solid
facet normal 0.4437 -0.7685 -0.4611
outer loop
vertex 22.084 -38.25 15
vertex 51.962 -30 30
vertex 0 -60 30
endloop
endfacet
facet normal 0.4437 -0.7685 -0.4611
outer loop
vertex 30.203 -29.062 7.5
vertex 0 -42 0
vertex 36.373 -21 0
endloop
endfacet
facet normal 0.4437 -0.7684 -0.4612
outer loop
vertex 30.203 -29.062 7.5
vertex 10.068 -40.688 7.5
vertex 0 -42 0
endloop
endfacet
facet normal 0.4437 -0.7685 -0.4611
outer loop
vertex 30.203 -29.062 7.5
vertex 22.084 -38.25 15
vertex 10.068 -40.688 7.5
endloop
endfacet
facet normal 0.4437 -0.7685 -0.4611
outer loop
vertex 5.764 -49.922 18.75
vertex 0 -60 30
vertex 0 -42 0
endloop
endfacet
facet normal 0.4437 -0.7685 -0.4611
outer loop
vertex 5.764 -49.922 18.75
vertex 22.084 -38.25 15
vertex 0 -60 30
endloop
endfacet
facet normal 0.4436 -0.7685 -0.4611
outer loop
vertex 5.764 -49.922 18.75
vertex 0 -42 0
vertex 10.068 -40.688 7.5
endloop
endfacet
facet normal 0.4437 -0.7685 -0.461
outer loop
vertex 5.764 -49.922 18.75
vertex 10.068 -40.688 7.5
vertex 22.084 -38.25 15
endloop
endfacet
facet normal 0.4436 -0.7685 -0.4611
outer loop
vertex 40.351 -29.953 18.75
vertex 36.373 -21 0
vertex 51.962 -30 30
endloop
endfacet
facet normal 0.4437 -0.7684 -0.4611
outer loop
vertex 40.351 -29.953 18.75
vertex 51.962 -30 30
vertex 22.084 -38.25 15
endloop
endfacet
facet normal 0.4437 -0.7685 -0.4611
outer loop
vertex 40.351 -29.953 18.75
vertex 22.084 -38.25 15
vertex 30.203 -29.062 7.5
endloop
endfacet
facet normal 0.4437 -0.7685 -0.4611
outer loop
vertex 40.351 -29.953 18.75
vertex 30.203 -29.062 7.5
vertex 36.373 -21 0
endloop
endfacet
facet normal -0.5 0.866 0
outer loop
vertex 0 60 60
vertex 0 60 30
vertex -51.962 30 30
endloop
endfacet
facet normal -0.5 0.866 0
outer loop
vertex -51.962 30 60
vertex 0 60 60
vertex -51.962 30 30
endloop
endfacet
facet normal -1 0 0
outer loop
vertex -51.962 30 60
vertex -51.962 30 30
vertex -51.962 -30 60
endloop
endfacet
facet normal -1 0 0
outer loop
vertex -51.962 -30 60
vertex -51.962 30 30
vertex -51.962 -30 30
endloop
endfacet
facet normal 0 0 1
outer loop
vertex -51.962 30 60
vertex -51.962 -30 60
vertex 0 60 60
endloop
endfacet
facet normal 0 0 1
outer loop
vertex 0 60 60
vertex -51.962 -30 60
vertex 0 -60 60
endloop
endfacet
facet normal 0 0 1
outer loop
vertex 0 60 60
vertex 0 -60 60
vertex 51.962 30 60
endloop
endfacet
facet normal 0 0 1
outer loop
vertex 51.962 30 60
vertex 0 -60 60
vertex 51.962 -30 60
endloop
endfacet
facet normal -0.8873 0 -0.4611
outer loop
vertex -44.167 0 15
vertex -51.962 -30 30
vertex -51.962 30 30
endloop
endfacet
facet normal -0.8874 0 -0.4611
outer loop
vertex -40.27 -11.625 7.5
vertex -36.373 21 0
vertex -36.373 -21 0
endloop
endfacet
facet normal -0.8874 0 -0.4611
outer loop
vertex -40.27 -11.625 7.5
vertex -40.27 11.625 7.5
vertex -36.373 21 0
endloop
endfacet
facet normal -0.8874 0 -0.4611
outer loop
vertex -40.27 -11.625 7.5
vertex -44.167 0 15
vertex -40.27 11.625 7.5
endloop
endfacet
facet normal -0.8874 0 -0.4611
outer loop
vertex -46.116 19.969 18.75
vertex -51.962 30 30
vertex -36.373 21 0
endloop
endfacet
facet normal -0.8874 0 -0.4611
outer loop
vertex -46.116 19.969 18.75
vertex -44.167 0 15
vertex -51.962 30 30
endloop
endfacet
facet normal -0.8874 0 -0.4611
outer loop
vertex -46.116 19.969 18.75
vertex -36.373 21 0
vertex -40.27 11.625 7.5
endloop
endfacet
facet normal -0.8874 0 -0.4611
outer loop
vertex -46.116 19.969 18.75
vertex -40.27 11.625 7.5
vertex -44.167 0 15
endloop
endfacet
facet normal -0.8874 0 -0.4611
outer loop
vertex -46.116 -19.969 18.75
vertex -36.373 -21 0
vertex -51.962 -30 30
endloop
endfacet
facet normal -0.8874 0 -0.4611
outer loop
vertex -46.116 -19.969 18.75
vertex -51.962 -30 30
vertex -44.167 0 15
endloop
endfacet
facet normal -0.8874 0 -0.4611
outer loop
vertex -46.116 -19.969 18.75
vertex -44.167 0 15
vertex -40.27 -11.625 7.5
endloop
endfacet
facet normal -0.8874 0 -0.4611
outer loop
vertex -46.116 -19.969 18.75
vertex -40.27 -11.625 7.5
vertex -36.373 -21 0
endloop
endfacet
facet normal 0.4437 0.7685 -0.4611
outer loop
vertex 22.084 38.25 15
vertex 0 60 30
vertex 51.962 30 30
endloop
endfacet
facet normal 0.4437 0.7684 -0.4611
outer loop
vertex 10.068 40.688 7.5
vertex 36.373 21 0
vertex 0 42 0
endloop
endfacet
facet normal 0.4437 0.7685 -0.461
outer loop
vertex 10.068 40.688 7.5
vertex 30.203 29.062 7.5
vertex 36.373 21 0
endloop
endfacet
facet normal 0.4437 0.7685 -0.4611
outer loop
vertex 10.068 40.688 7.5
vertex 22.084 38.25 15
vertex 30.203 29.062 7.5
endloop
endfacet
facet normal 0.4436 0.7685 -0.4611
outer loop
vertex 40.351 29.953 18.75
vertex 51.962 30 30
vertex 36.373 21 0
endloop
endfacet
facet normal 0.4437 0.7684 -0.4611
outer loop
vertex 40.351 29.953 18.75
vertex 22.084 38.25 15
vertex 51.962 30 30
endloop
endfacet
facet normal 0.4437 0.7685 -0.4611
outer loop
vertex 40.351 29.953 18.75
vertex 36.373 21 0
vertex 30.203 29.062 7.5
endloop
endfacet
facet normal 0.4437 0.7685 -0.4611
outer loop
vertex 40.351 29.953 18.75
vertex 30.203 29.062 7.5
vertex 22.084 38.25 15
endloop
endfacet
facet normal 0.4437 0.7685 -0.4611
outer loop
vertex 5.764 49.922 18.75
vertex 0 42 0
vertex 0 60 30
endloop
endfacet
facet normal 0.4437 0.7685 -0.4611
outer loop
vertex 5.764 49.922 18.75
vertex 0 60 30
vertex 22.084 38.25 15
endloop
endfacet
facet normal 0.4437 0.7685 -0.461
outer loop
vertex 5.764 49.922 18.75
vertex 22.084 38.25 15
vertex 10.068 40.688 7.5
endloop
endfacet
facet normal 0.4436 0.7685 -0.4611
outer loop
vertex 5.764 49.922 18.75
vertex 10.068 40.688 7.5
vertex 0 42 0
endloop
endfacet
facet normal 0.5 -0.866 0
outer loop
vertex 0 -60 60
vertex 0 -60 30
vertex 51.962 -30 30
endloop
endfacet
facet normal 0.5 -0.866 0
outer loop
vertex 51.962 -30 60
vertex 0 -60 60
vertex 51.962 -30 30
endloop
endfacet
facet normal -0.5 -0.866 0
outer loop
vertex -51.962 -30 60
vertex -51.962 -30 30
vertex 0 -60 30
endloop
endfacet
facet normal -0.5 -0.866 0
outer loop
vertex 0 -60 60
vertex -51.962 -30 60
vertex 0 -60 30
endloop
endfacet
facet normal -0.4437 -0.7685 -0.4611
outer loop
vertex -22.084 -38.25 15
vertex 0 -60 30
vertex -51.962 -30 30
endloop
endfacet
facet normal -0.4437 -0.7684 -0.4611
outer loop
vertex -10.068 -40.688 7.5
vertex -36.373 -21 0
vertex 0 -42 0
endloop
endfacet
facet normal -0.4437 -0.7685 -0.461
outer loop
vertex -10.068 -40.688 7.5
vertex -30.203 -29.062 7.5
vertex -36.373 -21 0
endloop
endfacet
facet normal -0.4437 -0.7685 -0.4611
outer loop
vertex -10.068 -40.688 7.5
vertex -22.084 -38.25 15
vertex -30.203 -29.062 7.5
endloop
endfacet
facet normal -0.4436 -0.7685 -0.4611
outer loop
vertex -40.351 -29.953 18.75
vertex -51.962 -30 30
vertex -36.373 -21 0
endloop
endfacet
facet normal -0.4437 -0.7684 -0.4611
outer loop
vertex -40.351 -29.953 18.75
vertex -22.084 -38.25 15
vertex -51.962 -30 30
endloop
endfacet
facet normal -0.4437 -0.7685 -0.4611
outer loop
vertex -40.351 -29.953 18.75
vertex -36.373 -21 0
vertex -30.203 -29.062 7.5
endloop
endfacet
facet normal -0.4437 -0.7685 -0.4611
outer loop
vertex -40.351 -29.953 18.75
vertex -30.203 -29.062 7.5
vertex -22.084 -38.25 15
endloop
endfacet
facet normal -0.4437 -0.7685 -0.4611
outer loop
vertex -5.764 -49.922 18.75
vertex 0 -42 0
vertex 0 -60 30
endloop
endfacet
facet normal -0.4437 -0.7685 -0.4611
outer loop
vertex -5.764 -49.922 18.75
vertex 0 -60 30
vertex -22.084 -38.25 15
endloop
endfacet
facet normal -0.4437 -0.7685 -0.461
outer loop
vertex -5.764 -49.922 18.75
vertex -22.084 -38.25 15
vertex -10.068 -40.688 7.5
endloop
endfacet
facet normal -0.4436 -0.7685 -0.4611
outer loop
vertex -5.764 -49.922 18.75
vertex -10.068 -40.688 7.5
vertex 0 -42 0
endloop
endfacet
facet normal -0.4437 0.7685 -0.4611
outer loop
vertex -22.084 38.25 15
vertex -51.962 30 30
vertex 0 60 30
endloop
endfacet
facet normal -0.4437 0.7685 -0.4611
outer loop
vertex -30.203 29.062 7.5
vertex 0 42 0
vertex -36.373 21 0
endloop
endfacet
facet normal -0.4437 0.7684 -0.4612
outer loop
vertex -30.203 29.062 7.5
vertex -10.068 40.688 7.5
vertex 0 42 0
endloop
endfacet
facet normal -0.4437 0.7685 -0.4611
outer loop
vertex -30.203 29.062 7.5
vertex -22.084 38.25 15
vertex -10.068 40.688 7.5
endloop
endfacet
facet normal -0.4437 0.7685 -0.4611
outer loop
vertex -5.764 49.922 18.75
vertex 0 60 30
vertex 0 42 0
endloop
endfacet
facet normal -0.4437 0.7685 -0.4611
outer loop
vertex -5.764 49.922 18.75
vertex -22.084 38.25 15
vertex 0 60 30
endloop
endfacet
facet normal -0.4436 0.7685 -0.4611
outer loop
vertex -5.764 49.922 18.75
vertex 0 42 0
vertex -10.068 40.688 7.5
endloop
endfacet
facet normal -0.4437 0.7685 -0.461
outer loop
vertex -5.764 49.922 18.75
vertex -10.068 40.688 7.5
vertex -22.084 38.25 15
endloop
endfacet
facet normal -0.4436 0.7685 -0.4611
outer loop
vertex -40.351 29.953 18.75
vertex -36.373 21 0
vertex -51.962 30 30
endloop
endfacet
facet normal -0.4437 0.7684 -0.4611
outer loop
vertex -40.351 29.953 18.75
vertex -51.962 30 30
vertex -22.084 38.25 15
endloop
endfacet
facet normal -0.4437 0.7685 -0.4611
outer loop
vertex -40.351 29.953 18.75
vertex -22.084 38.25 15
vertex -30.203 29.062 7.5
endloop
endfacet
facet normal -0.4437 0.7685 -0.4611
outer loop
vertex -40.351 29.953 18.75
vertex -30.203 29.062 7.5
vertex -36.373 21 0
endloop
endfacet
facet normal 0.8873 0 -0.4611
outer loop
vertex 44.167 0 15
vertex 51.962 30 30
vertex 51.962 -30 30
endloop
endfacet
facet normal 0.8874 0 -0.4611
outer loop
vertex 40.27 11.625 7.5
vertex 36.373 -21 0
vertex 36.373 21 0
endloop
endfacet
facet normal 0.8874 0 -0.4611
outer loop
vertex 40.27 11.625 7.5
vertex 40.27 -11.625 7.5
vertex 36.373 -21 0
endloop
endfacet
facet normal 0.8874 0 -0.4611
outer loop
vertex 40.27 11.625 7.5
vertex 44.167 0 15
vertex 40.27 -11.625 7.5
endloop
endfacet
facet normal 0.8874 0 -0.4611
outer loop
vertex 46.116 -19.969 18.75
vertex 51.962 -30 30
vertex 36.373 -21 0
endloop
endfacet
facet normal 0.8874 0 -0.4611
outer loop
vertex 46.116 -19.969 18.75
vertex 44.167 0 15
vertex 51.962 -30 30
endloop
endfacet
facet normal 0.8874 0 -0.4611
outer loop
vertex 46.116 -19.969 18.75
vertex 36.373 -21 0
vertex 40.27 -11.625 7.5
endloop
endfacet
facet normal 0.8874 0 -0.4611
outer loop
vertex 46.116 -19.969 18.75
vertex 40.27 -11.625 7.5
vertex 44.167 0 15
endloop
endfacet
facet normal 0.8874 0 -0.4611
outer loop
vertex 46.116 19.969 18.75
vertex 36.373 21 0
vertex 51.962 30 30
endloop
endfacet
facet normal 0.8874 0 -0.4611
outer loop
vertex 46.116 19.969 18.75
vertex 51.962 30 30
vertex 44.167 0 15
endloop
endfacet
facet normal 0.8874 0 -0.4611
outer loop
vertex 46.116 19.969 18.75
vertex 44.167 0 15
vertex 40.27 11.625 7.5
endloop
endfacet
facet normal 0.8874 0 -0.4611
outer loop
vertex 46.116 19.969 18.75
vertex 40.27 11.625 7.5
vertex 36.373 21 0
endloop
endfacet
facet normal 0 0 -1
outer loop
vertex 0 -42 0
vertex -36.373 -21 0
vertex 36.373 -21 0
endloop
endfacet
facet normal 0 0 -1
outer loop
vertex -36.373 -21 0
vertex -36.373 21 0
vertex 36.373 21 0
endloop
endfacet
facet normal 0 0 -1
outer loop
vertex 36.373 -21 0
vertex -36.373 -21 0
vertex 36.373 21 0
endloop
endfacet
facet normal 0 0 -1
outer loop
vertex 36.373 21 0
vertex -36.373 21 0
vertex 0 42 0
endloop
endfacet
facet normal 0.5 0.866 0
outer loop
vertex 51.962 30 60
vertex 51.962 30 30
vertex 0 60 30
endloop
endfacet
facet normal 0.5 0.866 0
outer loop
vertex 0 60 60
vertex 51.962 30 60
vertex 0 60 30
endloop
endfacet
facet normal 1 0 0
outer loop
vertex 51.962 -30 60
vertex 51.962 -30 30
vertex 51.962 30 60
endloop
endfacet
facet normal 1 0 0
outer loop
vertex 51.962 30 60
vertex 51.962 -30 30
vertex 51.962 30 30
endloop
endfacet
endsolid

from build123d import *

# Parameters (mm, degrees)
F4_DEPTH = 30


with BuildPart() as f3:
    # F0 (on Top) → F3 section 0
    with BuildSketch(Plane.XY):
        Polygon((-36.3730669589, -21), (0, -42), (36.3730669589, -21), (36.3730669589, 21), (0, 42), (-36.3730669589, 21), align=None)
    # F2 (on offset) → F3 section 1
    with BuildSketch(Plane.XY.offset(30)):
        Polygon((-51.9615242271, -30), (0, -60), (51.9615242271, -30), (51.9615242271, 30), (0, 60), (-51.9615242271, 30), align=None)
    loft()

    # F4 (add): a face of the model
    f4_faces = [f3.faces().sort_by_distance(p)[0] for p in [
        (0, 0, 30),
    ]]
    extrude(f4_faces, amount=F4_DEPTH)


solid = f3.part
